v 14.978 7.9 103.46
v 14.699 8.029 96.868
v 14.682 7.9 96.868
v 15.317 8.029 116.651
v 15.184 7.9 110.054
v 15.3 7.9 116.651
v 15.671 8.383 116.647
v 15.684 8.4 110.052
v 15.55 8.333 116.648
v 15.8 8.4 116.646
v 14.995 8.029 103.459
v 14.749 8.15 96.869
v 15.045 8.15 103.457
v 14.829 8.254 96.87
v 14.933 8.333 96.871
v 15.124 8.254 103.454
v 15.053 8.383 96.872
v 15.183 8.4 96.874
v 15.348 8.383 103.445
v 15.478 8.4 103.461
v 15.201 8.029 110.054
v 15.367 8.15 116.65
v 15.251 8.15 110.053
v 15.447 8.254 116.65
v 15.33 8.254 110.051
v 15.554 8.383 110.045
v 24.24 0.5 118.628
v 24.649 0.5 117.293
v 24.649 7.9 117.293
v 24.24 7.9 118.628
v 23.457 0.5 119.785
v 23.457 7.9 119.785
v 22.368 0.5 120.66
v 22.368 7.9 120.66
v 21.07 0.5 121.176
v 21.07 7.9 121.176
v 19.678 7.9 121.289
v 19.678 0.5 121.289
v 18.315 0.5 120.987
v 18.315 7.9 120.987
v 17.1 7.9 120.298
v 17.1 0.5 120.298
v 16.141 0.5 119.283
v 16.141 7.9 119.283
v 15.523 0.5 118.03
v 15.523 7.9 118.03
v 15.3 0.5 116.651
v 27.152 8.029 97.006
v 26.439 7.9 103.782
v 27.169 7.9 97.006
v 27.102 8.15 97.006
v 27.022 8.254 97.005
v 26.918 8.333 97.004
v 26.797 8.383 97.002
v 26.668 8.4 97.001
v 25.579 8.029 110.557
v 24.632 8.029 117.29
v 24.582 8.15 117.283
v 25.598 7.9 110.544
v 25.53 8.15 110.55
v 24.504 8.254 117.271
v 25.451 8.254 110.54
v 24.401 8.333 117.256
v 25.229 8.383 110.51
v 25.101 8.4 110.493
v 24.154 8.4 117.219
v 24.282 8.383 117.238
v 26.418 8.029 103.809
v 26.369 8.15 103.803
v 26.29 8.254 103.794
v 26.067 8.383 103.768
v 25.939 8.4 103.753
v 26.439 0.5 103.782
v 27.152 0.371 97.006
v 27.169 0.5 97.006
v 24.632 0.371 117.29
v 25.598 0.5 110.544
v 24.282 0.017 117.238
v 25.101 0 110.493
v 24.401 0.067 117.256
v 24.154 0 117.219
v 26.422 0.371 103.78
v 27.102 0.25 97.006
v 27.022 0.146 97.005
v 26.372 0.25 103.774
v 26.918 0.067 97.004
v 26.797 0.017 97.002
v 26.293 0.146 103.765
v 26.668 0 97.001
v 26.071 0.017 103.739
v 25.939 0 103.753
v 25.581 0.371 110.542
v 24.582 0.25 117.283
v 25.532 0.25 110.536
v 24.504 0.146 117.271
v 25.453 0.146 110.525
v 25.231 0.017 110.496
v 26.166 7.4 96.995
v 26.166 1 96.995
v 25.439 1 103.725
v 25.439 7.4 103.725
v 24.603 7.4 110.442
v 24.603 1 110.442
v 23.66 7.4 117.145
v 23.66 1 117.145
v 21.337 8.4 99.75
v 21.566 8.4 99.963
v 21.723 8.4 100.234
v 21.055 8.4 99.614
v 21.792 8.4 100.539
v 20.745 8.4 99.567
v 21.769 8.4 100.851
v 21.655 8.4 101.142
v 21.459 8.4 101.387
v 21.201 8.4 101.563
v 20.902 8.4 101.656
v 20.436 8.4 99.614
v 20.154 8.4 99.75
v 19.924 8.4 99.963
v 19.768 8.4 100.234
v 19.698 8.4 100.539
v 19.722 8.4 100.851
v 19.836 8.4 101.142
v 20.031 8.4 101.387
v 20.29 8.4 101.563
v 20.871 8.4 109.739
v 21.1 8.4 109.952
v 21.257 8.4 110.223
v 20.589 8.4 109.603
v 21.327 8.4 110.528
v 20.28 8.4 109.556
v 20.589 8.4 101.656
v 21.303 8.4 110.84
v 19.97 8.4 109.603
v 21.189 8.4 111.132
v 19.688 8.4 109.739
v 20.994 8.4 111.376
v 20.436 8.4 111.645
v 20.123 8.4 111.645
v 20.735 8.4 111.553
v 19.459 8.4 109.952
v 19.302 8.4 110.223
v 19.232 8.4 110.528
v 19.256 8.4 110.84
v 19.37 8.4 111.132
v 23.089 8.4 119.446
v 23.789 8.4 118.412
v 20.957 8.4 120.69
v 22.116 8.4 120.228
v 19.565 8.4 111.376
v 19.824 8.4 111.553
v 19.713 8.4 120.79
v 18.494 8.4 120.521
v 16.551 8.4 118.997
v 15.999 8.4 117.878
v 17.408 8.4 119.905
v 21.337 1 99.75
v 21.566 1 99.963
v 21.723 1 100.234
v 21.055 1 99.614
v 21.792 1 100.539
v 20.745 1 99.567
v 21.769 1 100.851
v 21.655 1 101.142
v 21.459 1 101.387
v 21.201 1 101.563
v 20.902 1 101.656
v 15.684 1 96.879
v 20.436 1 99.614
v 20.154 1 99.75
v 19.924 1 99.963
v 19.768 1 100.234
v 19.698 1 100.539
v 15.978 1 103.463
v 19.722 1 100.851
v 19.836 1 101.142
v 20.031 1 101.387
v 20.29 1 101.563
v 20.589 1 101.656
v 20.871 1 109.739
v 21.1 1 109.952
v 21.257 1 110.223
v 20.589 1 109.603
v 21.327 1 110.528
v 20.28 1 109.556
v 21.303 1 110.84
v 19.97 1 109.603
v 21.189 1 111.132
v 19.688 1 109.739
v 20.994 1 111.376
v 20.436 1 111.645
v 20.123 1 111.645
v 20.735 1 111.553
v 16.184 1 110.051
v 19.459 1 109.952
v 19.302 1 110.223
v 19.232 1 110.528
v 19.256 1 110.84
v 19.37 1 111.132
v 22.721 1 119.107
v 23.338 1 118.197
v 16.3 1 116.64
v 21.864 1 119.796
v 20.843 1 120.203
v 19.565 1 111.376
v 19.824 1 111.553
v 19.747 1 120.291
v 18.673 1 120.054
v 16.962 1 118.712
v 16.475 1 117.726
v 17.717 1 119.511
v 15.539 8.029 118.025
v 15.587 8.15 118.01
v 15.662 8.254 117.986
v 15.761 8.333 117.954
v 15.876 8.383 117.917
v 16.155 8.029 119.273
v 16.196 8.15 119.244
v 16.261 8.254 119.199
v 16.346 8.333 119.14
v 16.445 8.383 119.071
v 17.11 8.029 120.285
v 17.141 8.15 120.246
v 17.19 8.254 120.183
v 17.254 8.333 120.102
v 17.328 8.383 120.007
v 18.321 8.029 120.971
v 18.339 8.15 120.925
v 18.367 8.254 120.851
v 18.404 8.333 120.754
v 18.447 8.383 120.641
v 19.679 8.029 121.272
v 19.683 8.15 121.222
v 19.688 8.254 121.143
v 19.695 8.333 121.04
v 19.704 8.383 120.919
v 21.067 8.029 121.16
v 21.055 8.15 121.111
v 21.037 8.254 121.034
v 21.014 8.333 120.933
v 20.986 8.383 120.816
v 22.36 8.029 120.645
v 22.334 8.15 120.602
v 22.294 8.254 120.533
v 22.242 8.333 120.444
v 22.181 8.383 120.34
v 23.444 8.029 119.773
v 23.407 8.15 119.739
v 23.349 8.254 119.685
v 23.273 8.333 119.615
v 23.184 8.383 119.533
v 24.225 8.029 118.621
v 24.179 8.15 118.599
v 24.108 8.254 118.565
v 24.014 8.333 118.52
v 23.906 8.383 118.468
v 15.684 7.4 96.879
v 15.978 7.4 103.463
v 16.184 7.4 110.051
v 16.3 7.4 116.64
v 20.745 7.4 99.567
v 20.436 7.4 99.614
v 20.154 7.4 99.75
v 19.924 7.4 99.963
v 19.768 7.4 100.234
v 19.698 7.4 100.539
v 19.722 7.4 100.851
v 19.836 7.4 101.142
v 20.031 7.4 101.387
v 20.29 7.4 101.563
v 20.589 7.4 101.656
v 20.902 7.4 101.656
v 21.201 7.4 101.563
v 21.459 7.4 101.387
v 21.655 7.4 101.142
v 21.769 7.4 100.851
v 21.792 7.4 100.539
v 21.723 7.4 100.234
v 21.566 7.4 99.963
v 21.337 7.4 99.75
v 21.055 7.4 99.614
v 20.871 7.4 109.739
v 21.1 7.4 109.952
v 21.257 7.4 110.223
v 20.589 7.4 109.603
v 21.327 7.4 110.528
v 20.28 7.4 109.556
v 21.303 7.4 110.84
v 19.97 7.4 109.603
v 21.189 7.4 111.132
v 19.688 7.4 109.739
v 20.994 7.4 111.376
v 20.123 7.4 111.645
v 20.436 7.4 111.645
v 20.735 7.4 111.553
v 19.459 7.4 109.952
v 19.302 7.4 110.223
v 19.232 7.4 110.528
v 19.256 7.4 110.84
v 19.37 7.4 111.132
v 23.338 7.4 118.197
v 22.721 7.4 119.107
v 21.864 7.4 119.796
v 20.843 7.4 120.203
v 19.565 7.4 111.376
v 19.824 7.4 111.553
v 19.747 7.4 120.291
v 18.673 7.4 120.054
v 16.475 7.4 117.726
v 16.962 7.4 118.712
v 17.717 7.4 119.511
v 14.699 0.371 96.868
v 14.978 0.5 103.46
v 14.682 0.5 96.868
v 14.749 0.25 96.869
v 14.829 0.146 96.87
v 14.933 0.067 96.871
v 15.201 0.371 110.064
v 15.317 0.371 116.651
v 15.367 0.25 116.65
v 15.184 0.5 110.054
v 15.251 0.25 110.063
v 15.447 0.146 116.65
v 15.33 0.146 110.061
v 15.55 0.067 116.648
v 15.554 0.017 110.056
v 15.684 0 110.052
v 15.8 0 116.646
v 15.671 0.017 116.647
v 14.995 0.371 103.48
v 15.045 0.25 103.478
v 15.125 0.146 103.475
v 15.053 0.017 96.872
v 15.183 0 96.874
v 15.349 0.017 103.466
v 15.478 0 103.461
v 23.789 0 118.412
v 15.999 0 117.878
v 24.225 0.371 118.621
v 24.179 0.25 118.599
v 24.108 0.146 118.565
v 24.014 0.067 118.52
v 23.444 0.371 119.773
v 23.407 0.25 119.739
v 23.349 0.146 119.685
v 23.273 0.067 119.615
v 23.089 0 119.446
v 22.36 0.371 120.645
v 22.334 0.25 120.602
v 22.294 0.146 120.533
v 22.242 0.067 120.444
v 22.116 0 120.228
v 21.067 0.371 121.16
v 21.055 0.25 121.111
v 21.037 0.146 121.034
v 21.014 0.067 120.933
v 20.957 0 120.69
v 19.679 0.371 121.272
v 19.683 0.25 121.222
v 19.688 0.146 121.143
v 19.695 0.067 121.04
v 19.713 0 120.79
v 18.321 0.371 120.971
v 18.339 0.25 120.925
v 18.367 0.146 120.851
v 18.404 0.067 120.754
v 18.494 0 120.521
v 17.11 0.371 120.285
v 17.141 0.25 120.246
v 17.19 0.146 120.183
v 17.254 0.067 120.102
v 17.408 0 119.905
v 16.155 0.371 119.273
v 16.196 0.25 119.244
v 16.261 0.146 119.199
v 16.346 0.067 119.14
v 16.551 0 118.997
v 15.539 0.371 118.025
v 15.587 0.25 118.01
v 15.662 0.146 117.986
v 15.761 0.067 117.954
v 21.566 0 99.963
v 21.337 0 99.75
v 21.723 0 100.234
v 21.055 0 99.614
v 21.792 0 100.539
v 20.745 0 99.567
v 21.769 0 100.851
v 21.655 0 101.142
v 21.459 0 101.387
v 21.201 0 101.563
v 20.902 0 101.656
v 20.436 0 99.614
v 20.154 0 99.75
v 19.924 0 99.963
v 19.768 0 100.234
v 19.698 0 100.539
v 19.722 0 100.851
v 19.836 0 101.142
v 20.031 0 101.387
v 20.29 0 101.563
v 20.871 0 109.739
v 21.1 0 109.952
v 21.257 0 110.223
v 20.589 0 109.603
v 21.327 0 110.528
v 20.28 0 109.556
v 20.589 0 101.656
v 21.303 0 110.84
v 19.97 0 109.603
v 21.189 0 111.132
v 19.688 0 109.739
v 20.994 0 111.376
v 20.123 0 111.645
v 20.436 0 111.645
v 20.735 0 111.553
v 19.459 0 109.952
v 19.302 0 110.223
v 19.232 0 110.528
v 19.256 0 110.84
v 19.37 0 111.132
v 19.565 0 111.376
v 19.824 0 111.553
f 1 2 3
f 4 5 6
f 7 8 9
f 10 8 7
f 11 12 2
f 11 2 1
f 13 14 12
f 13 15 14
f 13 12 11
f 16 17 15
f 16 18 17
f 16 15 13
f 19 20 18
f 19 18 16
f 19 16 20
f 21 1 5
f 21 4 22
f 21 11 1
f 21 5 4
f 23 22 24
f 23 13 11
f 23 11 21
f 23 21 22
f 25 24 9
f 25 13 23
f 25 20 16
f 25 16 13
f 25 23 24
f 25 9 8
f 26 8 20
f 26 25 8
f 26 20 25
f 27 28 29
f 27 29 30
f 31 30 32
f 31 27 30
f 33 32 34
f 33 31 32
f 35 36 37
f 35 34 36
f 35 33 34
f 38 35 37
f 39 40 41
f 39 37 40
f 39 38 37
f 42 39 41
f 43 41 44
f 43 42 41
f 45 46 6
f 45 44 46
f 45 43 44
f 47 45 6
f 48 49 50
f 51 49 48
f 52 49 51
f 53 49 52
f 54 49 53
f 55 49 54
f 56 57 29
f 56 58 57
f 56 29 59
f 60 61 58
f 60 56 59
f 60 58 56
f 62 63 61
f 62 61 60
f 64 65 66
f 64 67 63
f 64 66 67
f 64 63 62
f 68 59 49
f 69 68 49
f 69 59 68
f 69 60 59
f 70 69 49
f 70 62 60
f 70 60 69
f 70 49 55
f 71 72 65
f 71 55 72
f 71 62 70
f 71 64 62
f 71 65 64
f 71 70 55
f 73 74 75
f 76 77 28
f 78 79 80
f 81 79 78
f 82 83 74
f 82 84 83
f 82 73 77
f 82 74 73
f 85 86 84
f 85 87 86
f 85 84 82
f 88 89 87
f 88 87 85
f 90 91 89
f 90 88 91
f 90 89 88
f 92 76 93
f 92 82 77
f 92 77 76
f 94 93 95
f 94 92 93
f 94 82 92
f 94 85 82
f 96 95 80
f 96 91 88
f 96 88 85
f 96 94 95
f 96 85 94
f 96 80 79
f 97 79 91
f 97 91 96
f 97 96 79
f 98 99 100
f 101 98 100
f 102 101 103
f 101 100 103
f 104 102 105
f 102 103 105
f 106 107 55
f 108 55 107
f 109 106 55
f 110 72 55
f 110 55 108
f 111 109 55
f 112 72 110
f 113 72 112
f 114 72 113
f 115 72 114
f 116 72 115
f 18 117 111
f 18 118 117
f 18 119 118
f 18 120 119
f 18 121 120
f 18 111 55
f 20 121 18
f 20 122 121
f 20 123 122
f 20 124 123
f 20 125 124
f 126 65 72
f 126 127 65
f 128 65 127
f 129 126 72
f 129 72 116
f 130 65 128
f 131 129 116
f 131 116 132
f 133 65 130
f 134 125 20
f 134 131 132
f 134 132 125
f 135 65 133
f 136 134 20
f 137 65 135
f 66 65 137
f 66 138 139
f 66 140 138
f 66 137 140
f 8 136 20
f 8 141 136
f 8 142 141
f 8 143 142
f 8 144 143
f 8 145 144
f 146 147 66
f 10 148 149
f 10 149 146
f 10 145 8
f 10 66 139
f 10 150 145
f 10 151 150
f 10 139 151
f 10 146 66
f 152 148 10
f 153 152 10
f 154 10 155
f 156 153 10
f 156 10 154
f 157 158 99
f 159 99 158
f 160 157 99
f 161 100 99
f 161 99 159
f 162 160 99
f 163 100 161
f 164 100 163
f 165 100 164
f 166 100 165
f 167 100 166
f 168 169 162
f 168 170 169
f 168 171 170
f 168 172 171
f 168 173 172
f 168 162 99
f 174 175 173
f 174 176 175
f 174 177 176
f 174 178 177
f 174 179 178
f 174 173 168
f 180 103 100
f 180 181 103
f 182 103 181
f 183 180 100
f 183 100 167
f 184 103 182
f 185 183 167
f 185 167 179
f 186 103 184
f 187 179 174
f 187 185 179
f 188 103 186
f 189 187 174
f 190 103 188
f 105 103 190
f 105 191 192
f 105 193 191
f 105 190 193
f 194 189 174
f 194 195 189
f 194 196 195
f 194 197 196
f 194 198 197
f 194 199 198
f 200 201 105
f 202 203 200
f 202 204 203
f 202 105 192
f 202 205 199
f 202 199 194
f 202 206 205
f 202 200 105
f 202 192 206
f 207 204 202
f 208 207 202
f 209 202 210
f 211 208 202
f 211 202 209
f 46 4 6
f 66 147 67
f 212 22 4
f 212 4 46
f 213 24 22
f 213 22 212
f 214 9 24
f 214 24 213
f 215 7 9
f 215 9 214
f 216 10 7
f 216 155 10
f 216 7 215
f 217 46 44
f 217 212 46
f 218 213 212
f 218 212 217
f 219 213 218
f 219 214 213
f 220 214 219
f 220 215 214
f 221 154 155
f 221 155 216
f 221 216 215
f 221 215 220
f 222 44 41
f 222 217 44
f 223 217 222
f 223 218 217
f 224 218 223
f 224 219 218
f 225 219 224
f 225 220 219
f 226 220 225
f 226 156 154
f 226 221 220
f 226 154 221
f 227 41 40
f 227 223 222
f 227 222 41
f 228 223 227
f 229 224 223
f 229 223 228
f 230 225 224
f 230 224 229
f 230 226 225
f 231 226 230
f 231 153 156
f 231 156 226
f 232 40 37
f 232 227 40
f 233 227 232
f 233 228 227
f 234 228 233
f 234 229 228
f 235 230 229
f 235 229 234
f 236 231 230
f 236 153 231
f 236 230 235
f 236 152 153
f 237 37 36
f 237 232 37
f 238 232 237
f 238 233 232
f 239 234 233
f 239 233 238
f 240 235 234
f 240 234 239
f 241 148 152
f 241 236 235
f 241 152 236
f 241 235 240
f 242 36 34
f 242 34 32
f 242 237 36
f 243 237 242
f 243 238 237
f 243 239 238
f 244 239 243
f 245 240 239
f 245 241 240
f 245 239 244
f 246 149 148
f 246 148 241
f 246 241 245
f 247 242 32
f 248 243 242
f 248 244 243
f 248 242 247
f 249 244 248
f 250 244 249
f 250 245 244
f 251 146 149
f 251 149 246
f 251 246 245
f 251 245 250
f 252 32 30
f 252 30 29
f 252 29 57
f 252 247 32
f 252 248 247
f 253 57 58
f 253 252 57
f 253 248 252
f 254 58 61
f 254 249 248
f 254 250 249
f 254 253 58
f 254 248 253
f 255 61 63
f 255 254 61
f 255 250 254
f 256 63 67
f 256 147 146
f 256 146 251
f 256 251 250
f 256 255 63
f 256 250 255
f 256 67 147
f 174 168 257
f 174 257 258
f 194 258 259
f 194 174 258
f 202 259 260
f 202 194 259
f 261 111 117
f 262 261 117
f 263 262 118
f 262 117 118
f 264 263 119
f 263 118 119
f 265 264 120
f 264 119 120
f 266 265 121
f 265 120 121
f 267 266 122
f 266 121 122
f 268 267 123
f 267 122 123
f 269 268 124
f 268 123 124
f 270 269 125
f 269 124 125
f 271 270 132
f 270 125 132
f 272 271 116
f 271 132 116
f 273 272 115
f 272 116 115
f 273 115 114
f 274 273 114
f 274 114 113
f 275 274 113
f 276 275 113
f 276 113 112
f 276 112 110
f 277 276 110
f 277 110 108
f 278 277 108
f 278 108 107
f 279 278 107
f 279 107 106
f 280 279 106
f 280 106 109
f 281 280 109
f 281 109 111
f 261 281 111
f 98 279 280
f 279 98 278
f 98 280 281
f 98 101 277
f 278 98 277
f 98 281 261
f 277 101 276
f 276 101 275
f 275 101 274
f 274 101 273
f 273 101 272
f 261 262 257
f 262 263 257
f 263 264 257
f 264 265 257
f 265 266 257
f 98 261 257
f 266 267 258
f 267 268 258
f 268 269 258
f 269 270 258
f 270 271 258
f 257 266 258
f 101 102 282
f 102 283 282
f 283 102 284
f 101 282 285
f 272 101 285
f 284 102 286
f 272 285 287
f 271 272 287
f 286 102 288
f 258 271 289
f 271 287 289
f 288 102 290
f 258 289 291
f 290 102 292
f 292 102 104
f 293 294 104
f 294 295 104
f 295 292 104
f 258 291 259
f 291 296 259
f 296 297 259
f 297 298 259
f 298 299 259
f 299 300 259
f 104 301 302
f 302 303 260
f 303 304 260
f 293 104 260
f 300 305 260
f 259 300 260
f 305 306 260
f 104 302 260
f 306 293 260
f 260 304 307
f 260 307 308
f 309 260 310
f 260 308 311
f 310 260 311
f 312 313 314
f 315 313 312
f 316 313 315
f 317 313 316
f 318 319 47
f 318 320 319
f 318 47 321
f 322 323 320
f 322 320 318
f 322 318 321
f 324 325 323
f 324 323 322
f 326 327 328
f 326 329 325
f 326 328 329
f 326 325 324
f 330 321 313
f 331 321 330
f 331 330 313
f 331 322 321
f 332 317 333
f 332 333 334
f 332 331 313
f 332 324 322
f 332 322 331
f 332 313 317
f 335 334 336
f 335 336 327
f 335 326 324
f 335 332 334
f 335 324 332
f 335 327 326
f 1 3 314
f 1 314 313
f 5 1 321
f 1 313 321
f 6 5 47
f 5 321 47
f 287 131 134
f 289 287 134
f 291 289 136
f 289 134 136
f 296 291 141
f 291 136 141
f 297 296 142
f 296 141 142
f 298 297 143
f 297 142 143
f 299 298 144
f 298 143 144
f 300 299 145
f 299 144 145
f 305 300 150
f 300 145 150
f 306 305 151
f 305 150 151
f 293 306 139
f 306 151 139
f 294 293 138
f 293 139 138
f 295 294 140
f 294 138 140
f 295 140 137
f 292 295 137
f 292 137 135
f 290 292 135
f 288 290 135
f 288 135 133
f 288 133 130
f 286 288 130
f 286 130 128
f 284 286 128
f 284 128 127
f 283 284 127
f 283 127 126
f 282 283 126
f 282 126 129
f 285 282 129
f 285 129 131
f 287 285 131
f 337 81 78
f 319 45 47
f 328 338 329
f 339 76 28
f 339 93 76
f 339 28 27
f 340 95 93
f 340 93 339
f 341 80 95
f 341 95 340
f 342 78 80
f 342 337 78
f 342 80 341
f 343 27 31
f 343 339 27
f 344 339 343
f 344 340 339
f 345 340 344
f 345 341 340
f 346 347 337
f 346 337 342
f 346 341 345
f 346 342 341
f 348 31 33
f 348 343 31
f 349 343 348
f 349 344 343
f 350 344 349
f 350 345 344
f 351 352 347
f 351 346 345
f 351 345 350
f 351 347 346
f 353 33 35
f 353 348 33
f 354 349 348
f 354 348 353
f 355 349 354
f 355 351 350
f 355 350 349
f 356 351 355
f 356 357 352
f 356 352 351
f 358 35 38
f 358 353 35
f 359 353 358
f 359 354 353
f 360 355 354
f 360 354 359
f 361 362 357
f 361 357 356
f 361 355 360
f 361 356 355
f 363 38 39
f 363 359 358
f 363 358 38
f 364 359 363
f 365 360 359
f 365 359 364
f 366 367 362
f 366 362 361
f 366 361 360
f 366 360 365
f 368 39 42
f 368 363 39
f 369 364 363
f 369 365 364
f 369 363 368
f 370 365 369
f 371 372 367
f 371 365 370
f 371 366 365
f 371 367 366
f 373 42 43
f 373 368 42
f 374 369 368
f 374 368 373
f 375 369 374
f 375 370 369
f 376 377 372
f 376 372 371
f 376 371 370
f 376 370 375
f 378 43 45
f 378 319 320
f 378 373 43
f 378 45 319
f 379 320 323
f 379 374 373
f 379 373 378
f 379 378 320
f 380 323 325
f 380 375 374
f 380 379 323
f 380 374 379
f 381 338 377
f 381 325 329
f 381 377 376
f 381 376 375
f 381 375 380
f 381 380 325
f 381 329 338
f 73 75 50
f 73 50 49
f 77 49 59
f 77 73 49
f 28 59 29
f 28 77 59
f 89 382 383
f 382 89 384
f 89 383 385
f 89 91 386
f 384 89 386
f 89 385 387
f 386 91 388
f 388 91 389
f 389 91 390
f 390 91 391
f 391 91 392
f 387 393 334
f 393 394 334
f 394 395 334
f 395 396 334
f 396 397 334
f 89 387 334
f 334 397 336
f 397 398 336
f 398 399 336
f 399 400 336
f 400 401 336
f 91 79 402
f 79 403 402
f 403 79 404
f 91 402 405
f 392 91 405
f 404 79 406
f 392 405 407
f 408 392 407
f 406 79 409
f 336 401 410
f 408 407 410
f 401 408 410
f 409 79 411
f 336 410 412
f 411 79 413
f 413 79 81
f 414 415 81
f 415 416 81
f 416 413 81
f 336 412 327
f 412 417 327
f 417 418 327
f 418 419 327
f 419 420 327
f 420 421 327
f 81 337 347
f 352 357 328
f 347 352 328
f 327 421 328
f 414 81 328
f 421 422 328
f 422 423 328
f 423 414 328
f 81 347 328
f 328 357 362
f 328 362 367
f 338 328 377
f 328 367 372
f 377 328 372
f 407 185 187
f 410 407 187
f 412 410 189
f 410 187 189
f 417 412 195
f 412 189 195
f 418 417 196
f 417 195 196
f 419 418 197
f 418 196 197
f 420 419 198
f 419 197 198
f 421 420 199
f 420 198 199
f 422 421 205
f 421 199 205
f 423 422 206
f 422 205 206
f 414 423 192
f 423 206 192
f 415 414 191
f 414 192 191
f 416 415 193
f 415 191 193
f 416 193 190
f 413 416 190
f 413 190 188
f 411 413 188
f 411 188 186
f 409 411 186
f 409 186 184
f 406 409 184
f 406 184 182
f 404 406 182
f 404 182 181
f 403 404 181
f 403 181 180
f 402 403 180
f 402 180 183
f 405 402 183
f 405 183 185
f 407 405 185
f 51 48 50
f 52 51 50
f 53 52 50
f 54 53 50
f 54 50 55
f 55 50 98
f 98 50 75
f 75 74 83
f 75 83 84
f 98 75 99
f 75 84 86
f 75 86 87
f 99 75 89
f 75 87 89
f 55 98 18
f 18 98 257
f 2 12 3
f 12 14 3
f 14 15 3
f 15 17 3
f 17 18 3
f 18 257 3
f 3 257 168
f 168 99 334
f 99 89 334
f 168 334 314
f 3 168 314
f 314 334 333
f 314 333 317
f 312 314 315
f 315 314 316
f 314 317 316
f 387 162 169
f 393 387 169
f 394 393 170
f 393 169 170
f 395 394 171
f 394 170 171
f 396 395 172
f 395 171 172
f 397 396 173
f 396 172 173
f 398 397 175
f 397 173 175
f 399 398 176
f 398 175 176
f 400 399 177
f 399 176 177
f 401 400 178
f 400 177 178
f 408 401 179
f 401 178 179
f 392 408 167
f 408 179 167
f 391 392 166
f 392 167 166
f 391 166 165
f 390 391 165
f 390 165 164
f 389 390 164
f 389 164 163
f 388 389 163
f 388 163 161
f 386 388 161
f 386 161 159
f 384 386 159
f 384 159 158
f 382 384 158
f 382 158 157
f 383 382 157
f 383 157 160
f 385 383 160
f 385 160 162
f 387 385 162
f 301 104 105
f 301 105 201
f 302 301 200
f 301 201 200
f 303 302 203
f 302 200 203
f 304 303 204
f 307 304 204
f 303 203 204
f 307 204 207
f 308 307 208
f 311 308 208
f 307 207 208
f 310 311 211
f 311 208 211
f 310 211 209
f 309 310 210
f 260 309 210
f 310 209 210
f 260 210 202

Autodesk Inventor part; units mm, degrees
ref_plane "YZ Plane" through (0, 0, 0) normal (1, 0, 0) x (0, 1, 0)
ref_plane "XZ Plane" through (0, 0, 0) normal (0, 1, 0) x (-1, 0, 0)
ref_plane "XY Plane" through (0, 0, 0) normal (0, 0, 1) x (1, 0, 0)
sketch "Sketch1" plane through (0, 0, 0) normal (0, 1, 0) x (-1, 0, 0)
  line L0 (0, 0) -> (-4, 0)
  line L1 (0, 0) -> (0, 36.6)
  line L2 (-24.4, 0) -> (-24.4, 6) construction
  line L3 (-18.4, 6) -> (-6, 6)
  line L4 (-6, 6) -> (-6, 30.6)
  line L5 (-6, 30.6) -> (-18.4, 30.6)
  line L6 (-18.4, 30.6) -> (-18.4, 6)
  line L7 (-24.4, 36.6) -> (-23.6295, 36.6) construction
  arc A0 (-20.163, 113.1038) -> (-23.4834, 116.9404) centre (-20, 116.6) ccw construction
  line L8 (-12.2, 4.1) -> (-12.2, 32.5) construction
  line L9 (-26.8761, 4.1) -> (8.0494, 4.1) construction
  line L10 (-27.3708, 32.5) -> (4.7796, 32.5) construction
  line L11 (-27.5308, 18.3) -> (1.4723, 18.3) construction
  arc A1 (-16.5002, 116.6381) -> (-9, 36.6) centre (470.9644, 121.9469) ccw construction
  line L12 (-23.6295, 36.6) -> (-13.0622, 36.6)
  line L13 (-9, 36.6) -> (0, 36.6)
  line L14 (-21.9951, 96.4905) -> (-19.8751, 96.6)
  line L15 (-19.8751, 96.6) -> (-15.8804, 96.8063) construction
  line L16 (-21.9951, 96.4905) -> (-25.9754, 96.8873) construction
  line L17 (-13.0622, 36.6) -> (-9.123, 37.2946) construction
  line L18 (-20, 116.6) -> (-16.5, 116.6) construction
  line L19 (-20, 116.6) -> (-20.7452, 100.6174) construction
  line L20 (-18.4, 6) -> (-24.4, 6)
  line L21 (-6, 6) -> (0, 6)
  arc A2 (-17.4, 0) -> (-14.7466, -6.9504) centre (-6.9703, 0) ccw
  arc A3 (-9.6573, 0) -> (-14.7466, -6.9504) centre (-0.5472, -12.0091) ccw
  arc A4 (-20.4, 0) -> (-13, -12) centre (-6.9703, 0) ccw
  arc A5 (-4, 0) -> (-13, -12) centre (1.9602, -13.8452) ccw
  line L22 (-14.7466, -6.9504) -> (-16.9833, -8.9496) construction
  line L23 (-14.7466, -6.9504) -> (-11.9734, -8.0949) construction
  line L24 (-20.4, 0) -> (-24.4, 0)
  line L25 (-17.4, 0) -> (-20.4, 0) construction
  line L26 (-9.6573, 0) -> (-17.4, 0)
  line L27 (-7.7289, -2.2981) -> (-9.6573, 0) construction
  arc A6 (-23.4834, 116.9404) -> (-20.163, 113.1038) centre (-20, 116.6) ccw construction
  line L28 (-21.4, -3.4679) -> (-21.4, 37.7463) construction
  line L29 (-24.4, 19.6) -> (-18.4, 19.6)
  line L30 (-6, 19.6) -> (0, 19.6)
  line L31 (-29.0378, 12.8) -> (2.5913, 12.8) construction
  arc A7 (-23.4618, 117.1157) -> (-24.4, 0) centre (391.9533, 55.2262) ccw construction
  arc A8 (-21.9951, 96.4905) -> (-23.6295, 36.6) centre (391.9533, 55.2262) ccw
  arc A9 (-19.8751, 96.6) -> (-13.0622, 36.6) centre (470.9644, 121.9469) ccw
  line L32 (-20.7452, 100.6174) -> (-20.9351, 96.5453) construction
  line L33 (-24.4, 6) -> (-24.4, 19.6)
  line L34 (-24.4, 19.6) -> (-24.4, 36.6) construction
  arc A10 (-15.3003, 116.6512) -> (-7.9935, 37.8) centre (470.9644, 121.9469) ccw
  line L35 (-7.9935, 37.8) -> (1.2, 37.8)
  line L36 (1.2, 37.8) -> (1.2, -1.2)
  line L37 (1.2, -1.2) -> (-3.7473, -1.2)
  arc A11 (-3.7473, -1.2) -> (-11.9132, -13.7694) centre (1.9602, -13.8452) ccw
  arc A12 (-21.5507, -1.2) -> (-11.9132, -13.7694) centre (-6.9703, 0) ccw
  line L38 (-21.5507, -1.2) -> (-25.45, -1.2)
  arc A13 (-24.6487, 117.2926) -> (-25.45, -1.2) centre (391.9533, 55.2262) ccw
  arc A14 (-15.3003, 116.6512) -> (-24.6487, 117.2926) centre (-20, 116.6) ccw
  line L39 (-15.8804, 96.8063) -> (-14.682, 96.8682)
  line L40 (-25.9754, 96.8873) -> (-27.1694, 97.0063)
  line L41 (-27.1694, 97.0063) -> (-14.682, 96.8682)
  point P0 (-20.2795, 110.6065)
  dimension "d4" = 6
  dimension "d5" = 24.6
  dimension "d6" = 12.4
  dimension "d7" = 6
  dimension "d15" = 7
  dimension "d17" = 9
  dimension "d21" = 20
  dimension "d23" = 80
  dimension "d24" = 20
  dimension "d29" = 170
  dimension "d30" = 6
  dimension "d31" = 10
  dimension "d43" = 4
  dimension "d44" = 3
  dimension "d45" = 4
  dimension "d50" = 13
  dimension "d51" = 12
  dimension "d52" = 130
  dimension "d89" = 6.8
  dimension "d90" = 28.4
  dimension "d107" = 420
  dimension "d108" = 4
  dimension "d109" = 4
  dimension "d114" = 1.2
  dimension "d115" = 1.2
extrude "Extrusion4" add sketch "Sketch1" along normal blind 8.4 contours A10 L41 A13 A14
shell "Shell1" thickness 1 removed faces 1 at (23.007, 2.8, 96.9603)
hole "Hole6" at (12.2, 0, 4.1) at (12.2, 0, 32.5) at (20.2795, 0, 110.6065) at (20.7452, 0, 100.6174) direction (0, 1, 0) diameter 2.1 end through all
fillet "Fillet12" radius 0.5 6 edges at (19.6783, 8.4, 121.289) (15.0918, 8.4, 106.7565) (26.0322, 8.4, 107.1647) (19.6783, 0, 121.289) (15.0918, 0, 106.7565) (26.0322, 0, 107.1647)
properties part number "LegEnd_Right_Head"
